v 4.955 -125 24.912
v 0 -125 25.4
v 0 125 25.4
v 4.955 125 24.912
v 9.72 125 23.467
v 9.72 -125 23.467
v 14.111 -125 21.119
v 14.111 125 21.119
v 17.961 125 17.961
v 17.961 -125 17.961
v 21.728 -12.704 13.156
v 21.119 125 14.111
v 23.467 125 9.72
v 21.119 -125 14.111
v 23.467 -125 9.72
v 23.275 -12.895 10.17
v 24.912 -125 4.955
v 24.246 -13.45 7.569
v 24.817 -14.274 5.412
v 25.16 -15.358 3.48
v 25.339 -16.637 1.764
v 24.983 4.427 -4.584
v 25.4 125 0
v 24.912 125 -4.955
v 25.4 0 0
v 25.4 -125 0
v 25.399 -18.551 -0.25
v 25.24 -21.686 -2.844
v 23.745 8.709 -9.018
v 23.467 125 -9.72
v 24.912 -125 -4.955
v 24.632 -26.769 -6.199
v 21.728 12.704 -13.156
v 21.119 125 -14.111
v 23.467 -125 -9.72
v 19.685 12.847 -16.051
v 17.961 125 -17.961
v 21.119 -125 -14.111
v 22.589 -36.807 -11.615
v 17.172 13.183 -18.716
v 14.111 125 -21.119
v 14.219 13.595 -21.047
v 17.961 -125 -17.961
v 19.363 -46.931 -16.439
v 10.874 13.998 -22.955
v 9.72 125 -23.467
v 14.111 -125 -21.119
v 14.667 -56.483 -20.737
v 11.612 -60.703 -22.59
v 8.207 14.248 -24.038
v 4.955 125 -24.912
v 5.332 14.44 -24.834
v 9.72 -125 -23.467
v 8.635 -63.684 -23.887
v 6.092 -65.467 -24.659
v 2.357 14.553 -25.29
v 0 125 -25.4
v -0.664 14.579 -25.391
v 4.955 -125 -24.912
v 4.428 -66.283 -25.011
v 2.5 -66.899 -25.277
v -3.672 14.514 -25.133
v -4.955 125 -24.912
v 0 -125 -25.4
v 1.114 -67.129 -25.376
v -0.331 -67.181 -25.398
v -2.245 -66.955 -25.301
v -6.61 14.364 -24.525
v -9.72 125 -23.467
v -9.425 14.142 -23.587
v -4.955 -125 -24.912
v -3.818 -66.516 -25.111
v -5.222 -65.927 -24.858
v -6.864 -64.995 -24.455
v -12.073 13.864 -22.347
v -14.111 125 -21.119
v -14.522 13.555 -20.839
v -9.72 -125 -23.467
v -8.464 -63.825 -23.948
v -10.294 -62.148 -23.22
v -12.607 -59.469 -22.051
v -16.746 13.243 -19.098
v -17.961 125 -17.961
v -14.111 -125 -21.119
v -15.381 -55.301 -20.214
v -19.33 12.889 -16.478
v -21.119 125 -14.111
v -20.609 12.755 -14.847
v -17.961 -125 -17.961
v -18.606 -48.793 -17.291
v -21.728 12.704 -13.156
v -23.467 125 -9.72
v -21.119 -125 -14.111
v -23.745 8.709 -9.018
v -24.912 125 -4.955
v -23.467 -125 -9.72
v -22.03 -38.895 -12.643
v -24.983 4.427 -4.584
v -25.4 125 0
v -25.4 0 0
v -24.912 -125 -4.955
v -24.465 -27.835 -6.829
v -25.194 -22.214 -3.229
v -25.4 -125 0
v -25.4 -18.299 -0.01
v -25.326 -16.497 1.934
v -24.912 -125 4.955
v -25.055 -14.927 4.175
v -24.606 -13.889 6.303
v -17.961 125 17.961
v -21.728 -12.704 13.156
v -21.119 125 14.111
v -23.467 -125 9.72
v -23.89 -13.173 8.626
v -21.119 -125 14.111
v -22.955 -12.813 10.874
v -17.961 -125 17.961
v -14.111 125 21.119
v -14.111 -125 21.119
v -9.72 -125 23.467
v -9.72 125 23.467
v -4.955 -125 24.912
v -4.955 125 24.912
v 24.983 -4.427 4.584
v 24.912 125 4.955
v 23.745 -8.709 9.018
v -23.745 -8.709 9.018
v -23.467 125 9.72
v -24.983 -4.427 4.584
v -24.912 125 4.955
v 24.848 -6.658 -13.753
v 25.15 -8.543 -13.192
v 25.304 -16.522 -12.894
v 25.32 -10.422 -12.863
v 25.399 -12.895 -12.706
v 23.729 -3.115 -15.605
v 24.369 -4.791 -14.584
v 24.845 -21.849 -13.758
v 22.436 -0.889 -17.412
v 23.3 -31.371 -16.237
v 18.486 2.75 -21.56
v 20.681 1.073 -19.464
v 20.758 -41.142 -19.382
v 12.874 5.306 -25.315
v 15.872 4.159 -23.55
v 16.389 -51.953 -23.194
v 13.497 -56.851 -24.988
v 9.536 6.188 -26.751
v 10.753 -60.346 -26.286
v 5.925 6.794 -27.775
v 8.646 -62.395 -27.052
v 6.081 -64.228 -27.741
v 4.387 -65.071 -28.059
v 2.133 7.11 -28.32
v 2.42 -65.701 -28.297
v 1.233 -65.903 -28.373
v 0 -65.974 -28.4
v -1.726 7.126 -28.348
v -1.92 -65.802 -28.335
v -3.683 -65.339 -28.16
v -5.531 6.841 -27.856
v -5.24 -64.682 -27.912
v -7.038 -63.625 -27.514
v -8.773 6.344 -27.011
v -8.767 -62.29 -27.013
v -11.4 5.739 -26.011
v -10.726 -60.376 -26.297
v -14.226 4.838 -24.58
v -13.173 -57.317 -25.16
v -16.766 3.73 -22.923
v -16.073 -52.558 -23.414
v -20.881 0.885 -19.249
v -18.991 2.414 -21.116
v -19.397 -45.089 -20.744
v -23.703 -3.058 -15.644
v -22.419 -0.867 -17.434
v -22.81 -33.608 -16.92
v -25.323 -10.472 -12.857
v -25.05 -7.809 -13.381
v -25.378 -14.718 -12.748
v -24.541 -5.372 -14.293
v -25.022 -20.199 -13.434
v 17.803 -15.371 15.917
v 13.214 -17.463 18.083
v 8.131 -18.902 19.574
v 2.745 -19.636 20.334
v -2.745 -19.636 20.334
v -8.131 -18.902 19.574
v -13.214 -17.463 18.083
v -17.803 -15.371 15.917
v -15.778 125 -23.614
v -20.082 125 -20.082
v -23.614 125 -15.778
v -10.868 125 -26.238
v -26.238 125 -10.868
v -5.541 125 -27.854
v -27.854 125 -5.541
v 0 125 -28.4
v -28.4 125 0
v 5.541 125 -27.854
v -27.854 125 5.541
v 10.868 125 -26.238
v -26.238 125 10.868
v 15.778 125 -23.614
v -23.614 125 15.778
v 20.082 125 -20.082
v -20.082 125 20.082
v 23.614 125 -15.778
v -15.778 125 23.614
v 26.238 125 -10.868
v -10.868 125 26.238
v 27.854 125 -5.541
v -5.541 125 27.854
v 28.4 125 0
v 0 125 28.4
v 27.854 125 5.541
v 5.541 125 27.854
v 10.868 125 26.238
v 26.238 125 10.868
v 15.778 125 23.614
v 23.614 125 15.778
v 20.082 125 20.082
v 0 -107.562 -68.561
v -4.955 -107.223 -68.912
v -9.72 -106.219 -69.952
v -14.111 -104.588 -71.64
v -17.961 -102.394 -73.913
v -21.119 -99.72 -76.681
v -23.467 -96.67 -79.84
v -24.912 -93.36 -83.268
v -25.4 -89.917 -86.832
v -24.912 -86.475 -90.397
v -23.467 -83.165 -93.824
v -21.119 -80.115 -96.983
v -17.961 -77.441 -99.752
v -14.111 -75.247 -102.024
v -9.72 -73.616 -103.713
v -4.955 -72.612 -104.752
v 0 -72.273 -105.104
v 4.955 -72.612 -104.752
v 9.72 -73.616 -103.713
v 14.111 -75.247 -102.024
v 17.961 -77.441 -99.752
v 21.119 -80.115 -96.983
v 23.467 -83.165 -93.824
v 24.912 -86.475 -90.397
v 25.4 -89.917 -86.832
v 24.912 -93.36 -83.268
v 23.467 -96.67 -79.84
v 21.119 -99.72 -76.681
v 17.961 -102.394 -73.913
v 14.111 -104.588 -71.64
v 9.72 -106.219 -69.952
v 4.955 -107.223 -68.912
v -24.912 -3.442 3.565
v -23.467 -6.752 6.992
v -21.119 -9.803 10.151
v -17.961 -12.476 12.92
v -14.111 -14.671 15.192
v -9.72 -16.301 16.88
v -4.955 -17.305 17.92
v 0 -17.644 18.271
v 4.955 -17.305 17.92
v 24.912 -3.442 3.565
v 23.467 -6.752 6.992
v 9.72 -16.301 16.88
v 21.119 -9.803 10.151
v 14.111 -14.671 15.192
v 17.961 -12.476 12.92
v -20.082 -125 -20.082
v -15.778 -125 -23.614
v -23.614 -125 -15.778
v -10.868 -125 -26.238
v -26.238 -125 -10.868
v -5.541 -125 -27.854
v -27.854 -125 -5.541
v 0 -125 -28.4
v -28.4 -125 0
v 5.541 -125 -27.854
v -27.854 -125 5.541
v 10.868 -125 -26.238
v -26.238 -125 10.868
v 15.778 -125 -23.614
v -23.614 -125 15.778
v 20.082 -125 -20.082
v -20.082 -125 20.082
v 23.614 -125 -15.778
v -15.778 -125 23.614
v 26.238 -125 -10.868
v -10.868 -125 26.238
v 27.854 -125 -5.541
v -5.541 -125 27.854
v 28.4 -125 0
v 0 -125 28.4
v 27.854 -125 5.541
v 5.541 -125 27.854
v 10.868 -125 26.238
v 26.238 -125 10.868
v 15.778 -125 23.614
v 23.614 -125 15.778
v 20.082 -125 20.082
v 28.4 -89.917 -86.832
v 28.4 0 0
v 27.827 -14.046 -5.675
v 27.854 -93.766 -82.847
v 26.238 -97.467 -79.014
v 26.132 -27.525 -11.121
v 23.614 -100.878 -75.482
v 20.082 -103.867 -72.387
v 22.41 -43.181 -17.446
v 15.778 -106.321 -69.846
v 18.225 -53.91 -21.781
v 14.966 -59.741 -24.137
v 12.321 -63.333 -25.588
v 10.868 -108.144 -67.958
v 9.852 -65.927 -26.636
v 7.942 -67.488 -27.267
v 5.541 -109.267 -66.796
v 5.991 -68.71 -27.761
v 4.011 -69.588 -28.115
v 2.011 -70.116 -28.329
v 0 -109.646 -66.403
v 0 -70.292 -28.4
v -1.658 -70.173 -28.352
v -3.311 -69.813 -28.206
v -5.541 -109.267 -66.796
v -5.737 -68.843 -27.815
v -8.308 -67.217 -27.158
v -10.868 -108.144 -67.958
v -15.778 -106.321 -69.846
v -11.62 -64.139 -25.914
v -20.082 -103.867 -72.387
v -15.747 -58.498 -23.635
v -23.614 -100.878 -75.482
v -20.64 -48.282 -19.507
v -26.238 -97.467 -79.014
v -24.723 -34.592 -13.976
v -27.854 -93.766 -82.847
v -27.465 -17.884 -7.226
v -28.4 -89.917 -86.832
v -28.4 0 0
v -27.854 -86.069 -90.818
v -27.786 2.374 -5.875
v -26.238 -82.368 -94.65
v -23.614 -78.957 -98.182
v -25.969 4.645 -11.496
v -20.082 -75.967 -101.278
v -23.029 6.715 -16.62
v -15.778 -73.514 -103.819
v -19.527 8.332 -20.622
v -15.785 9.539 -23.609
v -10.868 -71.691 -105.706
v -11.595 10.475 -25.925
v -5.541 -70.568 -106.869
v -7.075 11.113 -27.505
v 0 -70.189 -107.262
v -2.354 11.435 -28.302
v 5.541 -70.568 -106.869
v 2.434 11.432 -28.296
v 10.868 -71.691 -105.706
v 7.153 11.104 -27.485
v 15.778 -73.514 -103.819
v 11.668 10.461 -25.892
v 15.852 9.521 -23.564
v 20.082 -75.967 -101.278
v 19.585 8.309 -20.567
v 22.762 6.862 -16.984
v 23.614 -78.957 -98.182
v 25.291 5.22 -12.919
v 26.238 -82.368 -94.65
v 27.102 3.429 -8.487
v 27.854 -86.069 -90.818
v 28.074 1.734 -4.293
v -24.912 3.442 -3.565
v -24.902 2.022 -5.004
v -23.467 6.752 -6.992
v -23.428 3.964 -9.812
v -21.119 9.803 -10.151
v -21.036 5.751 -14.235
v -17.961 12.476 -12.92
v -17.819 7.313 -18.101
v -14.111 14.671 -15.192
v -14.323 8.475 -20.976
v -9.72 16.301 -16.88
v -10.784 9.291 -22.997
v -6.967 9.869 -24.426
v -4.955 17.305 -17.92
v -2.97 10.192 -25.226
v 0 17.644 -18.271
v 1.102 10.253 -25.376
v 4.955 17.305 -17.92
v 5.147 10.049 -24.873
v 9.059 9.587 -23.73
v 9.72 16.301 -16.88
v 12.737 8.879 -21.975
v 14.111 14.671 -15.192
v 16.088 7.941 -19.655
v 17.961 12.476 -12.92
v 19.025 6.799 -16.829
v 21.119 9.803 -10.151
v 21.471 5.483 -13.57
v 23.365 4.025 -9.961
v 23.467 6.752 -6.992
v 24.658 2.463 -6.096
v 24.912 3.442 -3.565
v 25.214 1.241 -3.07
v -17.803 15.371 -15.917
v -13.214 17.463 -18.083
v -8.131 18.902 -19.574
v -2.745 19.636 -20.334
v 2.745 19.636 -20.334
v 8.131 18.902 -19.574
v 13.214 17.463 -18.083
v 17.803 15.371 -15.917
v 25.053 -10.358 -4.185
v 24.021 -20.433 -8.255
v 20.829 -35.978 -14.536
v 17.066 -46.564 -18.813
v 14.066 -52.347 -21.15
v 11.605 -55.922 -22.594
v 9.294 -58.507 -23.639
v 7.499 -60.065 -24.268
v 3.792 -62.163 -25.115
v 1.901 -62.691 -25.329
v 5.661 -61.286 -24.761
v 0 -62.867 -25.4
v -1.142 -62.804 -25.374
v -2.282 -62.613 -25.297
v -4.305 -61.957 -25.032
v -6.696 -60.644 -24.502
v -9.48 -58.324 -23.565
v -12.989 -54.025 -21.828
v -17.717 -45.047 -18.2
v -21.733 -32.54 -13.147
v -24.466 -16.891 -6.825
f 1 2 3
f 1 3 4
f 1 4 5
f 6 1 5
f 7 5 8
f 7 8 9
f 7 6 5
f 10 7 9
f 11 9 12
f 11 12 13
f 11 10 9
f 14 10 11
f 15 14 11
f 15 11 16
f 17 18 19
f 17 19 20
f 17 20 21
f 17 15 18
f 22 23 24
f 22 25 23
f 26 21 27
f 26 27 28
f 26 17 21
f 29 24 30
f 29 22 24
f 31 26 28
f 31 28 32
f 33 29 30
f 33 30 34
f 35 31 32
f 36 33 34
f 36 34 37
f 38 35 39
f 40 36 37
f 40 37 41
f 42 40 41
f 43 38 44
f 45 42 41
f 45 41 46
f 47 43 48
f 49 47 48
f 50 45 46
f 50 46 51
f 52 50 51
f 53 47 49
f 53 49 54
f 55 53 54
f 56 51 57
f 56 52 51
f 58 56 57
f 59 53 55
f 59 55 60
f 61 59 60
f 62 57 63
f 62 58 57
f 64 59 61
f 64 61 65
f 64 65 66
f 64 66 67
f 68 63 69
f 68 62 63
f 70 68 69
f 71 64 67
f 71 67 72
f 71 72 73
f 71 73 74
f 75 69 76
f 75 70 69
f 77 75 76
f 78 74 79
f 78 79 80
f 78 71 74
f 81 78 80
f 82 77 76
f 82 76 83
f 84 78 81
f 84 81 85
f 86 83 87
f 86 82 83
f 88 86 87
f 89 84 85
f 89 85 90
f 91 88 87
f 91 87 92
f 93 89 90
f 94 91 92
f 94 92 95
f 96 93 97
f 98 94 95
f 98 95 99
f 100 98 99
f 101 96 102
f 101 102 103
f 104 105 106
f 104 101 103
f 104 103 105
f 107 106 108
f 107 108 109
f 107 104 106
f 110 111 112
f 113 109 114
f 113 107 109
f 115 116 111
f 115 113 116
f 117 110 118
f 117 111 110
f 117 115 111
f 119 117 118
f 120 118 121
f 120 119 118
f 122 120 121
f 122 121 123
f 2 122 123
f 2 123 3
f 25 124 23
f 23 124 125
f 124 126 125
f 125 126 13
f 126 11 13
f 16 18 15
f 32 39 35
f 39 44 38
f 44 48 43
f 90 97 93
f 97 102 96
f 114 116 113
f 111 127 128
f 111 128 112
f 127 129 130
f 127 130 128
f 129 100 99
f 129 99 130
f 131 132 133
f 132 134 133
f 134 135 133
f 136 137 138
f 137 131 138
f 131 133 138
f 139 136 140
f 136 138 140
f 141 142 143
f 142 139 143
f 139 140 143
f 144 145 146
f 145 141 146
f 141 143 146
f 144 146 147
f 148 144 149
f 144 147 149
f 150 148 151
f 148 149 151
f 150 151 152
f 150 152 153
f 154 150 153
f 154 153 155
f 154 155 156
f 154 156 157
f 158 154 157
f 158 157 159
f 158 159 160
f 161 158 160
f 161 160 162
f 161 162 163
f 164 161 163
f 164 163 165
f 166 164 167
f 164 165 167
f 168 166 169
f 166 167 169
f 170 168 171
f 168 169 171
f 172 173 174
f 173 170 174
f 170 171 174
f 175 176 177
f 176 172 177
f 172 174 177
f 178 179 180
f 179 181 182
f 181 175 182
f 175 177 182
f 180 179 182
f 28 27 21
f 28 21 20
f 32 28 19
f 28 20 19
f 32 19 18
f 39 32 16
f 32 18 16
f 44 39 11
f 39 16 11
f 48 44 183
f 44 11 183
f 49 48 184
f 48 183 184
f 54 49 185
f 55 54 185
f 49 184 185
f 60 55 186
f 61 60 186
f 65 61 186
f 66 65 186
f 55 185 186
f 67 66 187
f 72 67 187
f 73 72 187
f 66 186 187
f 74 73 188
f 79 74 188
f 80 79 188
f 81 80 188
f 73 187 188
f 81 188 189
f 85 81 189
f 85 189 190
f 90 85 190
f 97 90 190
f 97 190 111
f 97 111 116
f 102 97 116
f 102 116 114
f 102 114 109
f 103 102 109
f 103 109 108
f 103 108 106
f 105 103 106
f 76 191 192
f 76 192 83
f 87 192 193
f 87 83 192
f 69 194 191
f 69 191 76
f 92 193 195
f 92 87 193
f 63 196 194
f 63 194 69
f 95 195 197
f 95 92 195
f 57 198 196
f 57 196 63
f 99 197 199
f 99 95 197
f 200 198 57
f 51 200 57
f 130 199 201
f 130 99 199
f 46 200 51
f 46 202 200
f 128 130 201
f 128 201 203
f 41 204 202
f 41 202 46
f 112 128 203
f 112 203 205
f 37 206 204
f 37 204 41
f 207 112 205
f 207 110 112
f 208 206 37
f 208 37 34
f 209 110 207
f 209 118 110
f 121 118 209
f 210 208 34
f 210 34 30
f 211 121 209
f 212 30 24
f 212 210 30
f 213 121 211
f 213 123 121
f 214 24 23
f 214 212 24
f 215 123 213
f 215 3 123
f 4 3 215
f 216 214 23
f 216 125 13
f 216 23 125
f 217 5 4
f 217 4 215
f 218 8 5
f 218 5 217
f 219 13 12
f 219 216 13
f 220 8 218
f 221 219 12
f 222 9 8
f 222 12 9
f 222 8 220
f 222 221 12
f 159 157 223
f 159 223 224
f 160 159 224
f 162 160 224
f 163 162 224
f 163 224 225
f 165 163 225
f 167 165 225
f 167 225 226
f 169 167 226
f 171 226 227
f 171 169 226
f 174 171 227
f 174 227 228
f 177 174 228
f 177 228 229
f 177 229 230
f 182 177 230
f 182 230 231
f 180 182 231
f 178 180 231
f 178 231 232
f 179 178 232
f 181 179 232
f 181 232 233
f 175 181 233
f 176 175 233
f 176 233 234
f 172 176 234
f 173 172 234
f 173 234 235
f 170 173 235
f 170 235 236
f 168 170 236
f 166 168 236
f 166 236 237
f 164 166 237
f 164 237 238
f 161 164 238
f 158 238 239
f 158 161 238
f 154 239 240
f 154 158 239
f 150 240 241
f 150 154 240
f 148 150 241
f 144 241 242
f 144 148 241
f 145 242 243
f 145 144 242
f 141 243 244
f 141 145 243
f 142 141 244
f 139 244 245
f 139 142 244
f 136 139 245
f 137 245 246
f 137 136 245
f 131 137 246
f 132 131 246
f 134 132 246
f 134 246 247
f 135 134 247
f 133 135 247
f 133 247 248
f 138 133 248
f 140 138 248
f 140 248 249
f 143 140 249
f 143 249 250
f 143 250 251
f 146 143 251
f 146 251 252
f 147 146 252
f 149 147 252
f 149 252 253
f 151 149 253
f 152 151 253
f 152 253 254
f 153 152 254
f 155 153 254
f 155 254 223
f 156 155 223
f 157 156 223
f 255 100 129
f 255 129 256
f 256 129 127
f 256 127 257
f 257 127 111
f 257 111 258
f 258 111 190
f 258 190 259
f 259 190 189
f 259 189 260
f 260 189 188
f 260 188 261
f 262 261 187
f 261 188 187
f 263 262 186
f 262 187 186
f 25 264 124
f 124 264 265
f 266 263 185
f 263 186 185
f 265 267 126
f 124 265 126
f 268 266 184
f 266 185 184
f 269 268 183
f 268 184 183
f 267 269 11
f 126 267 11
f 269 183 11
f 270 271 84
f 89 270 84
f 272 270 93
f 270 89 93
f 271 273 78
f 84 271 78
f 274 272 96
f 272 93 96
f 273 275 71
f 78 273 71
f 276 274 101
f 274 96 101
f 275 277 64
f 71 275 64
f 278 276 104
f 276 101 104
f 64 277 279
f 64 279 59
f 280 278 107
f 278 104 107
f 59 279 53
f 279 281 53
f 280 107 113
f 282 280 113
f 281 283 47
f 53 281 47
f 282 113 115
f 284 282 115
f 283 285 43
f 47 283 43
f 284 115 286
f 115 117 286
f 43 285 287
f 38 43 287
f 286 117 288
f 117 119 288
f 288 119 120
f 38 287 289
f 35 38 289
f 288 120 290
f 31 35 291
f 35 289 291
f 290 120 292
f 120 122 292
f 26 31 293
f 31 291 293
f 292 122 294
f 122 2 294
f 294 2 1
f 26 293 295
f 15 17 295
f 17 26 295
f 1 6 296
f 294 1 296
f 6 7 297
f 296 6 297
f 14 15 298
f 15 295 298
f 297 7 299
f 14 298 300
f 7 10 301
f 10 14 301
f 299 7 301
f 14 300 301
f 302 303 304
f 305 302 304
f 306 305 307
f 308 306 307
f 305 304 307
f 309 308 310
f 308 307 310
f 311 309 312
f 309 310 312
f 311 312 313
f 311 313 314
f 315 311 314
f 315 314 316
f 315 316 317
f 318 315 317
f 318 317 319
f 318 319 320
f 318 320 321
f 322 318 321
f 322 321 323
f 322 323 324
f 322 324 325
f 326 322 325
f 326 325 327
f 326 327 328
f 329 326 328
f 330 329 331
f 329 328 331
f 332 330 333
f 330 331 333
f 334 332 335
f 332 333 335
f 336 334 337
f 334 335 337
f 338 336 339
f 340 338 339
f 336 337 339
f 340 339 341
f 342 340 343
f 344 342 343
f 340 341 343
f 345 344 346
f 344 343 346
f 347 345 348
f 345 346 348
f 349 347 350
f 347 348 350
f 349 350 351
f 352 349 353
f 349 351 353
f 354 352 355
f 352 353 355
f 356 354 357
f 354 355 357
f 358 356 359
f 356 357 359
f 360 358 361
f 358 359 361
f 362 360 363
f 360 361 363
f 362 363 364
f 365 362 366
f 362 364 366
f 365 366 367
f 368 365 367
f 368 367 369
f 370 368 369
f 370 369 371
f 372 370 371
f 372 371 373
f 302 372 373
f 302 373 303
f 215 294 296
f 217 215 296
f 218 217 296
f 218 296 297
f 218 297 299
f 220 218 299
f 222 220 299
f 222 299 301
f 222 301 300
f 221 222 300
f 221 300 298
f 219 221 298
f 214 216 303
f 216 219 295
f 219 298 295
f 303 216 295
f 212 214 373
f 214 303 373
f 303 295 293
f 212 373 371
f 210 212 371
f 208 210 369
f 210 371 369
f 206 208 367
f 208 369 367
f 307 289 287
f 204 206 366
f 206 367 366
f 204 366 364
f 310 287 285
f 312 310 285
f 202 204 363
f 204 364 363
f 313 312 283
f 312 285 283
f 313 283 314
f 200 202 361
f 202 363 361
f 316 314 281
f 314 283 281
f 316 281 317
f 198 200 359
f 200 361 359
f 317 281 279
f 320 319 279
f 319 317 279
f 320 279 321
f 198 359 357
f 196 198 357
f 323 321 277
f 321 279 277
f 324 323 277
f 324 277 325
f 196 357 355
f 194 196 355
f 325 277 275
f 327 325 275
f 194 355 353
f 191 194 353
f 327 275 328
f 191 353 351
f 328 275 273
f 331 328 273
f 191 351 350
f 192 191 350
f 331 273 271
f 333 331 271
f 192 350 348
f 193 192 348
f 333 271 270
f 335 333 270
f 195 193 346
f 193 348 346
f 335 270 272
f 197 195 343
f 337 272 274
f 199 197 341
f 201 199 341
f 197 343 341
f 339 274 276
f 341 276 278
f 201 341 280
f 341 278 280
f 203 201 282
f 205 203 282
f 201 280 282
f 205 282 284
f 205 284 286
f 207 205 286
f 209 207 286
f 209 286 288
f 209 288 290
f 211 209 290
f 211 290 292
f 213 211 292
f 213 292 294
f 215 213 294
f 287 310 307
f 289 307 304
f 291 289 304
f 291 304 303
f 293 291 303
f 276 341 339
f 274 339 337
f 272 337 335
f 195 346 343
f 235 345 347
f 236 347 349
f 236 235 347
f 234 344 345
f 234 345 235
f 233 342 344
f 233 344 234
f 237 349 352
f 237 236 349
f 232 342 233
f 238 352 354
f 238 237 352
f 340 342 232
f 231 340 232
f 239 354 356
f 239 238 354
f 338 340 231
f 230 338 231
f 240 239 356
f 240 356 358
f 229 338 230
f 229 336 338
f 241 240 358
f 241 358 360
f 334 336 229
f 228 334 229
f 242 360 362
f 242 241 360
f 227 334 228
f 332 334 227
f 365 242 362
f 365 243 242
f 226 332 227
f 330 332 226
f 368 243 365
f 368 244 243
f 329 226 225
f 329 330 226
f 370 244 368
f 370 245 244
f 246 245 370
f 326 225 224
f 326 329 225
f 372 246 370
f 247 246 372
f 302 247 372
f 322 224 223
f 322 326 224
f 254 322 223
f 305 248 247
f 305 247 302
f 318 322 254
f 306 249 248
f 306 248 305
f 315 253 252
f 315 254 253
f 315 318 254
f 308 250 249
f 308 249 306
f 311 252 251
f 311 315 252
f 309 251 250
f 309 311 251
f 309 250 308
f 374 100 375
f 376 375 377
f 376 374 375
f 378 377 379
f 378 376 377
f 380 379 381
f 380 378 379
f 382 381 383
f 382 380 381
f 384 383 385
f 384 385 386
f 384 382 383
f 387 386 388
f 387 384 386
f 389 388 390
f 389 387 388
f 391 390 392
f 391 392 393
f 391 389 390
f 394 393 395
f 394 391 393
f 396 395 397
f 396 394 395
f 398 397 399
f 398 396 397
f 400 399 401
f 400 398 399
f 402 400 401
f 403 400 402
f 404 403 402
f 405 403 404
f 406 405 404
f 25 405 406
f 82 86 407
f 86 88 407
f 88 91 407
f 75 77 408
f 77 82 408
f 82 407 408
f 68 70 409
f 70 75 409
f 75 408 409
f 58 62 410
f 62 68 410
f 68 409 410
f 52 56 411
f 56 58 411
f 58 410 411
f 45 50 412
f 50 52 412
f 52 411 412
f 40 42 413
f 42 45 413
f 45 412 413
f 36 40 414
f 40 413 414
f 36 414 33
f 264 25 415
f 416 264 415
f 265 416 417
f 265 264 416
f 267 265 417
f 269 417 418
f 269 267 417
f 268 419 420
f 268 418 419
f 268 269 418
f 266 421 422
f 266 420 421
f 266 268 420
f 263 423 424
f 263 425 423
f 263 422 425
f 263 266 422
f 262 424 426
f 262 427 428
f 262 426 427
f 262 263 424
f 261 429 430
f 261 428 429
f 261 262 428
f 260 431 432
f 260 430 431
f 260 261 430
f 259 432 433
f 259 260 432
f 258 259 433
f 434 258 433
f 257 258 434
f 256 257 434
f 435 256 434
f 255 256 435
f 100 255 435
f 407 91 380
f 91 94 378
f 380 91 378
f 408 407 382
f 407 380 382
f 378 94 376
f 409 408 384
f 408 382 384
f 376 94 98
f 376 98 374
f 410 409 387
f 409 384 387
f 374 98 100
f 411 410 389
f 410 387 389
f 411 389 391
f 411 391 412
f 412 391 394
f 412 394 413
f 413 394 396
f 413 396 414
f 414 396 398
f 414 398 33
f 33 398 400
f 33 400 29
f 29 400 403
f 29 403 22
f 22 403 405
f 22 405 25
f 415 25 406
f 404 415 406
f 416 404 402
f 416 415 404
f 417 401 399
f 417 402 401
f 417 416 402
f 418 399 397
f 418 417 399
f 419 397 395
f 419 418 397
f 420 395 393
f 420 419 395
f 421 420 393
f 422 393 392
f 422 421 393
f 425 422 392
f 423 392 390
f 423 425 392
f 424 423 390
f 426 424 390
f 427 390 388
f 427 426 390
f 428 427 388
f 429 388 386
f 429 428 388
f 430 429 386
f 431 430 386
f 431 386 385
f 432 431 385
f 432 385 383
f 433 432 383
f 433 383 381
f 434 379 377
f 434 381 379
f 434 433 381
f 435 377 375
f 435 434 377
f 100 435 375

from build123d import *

# Parameters (mm, degrees)
SALIENTE_EXTRUIR1_DEPTH      = 125
SALIENTE_EXTRUIR1_DEPTH_BACK = 125
CROQUIS1_R                   = 28.4
CROQUIS1_R_2                 = 25.4
CROQUIS4_R                   = 28.4
CROQUIS4_R_2                 = 25.4
SALIENTE_EXTRUIR3_DEPTH      = 125


with BuildPart() as part:
    # Croquis1 → Saliente-Extruir1 (new, two sides: drawn at the far end of the back side and taken through both)
    with BuildSketch(Plane(origin=(0, 0, 0), x_dir=(1, 0, 0), z_dir=(0, 1, 0)).offset(-SALIENTE_EXTRUIR1_DEPTH_BACK)):
        Circle(CROQUIS1_R)
        Circle(CROQUIS1_R_2, mode=Mode.SUBTRACT)
    extrude(amount=SALIENTE_EXTRUIR1_DEPTH + SALIENTE_EXTRUIR1_DEPTH_BACK)

    # Croquis4 → Saliente-Extruir3 (add)
    with BuildSketch(Plane(origin=(0, 0, 0), x_dir=(0, 0.6946583704589961, -0.7193398003386523), z_dir=(0, -0.7193398003386523, -0.6946583704589961))):
        Circle(CROQUIS4_R)
        Circle(CROQUIS4_R_2, mode=Mode.SUBTRACT)
    extrude(amount=SALIENTE_EXTRUIR3_DEPTH)


solid = part.part
